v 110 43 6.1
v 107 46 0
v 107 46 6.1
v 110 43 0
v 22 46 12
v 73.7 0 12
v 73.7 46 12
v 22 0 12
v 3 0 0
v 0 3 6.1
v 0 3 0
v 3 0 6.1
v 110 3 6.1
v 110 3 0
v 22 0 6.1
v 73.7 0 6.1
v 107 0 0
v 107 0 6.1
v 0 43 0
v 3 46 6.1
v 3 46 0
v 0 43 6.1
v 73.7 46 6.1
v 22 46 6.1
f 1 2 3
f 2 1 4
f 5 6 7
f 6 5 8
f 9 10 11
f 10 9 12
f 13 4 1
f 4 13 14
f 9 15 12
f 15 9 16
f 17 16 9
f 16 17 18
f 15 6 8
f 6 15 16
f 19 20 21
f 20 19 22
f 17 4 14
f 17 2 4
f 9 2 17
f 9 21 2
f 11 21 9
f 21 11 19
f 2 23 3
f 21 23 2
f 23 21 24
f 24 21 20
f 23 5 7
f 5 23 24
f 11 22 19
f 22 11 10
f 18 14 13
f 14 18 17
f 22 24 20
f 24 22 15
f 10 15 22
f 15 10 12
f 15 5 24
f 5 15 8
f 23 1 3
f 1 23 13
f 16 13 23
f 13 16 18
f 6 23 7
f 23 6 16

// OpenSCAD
$fn = 32;

// ----------------------------------------------------------------------
// Stepped bar: centerstep, 110 x 46 x 12/6.1 mm
// ----------------------------------------------------------------------

// --- parameters (mm) ---
bar_l = 110;              // bar length, X
bar_w = 46;               // bar width, Y
plate_t = 12;             // thickness of the thick zone, Z
thin_t = 6.1;             // thickness of the thin zone
corner_c = 3;             // corner chamfer of the bar
step_cut = 5.9;           // material removed from the thin zone
thick_from = 22;          // start of the thick middle zone
thick_to = 73.7;          // end of the thick middle zone
depth_1 = 5.9;            // depth of cut 1 from the top face
depth_2 = 5.9;            // depth of cut 2 from the top face

profile = [[3, 0], [107, 0], [110, 3], [110, 43], [107, 46], [3, 46], [0, 43], [0, 3]];  // primary outline, 8 points, counter clockwise
void_1 = [[-1, -1], [22, -1], [22, 47], [-1, 47]];  // thin left end, 4 points
void_2 = [[73.7, -1], [111, -1], [111, 47], [73.7, 47]];  // thin right end, 4 points

// --- the one profile operation ---
difference() {
  linear_extrude(height = plate_t) polygon(points = profile);
  translate([0, 0, plate_t - depth_1])
    linear_extrude(height = depth_1 + 1) polygon(points = void_1);
  translate([0, 0, plate_t - depth_2])
    linear_extrude(height = depth_2 + 1) polygon(points = void_2);
}
